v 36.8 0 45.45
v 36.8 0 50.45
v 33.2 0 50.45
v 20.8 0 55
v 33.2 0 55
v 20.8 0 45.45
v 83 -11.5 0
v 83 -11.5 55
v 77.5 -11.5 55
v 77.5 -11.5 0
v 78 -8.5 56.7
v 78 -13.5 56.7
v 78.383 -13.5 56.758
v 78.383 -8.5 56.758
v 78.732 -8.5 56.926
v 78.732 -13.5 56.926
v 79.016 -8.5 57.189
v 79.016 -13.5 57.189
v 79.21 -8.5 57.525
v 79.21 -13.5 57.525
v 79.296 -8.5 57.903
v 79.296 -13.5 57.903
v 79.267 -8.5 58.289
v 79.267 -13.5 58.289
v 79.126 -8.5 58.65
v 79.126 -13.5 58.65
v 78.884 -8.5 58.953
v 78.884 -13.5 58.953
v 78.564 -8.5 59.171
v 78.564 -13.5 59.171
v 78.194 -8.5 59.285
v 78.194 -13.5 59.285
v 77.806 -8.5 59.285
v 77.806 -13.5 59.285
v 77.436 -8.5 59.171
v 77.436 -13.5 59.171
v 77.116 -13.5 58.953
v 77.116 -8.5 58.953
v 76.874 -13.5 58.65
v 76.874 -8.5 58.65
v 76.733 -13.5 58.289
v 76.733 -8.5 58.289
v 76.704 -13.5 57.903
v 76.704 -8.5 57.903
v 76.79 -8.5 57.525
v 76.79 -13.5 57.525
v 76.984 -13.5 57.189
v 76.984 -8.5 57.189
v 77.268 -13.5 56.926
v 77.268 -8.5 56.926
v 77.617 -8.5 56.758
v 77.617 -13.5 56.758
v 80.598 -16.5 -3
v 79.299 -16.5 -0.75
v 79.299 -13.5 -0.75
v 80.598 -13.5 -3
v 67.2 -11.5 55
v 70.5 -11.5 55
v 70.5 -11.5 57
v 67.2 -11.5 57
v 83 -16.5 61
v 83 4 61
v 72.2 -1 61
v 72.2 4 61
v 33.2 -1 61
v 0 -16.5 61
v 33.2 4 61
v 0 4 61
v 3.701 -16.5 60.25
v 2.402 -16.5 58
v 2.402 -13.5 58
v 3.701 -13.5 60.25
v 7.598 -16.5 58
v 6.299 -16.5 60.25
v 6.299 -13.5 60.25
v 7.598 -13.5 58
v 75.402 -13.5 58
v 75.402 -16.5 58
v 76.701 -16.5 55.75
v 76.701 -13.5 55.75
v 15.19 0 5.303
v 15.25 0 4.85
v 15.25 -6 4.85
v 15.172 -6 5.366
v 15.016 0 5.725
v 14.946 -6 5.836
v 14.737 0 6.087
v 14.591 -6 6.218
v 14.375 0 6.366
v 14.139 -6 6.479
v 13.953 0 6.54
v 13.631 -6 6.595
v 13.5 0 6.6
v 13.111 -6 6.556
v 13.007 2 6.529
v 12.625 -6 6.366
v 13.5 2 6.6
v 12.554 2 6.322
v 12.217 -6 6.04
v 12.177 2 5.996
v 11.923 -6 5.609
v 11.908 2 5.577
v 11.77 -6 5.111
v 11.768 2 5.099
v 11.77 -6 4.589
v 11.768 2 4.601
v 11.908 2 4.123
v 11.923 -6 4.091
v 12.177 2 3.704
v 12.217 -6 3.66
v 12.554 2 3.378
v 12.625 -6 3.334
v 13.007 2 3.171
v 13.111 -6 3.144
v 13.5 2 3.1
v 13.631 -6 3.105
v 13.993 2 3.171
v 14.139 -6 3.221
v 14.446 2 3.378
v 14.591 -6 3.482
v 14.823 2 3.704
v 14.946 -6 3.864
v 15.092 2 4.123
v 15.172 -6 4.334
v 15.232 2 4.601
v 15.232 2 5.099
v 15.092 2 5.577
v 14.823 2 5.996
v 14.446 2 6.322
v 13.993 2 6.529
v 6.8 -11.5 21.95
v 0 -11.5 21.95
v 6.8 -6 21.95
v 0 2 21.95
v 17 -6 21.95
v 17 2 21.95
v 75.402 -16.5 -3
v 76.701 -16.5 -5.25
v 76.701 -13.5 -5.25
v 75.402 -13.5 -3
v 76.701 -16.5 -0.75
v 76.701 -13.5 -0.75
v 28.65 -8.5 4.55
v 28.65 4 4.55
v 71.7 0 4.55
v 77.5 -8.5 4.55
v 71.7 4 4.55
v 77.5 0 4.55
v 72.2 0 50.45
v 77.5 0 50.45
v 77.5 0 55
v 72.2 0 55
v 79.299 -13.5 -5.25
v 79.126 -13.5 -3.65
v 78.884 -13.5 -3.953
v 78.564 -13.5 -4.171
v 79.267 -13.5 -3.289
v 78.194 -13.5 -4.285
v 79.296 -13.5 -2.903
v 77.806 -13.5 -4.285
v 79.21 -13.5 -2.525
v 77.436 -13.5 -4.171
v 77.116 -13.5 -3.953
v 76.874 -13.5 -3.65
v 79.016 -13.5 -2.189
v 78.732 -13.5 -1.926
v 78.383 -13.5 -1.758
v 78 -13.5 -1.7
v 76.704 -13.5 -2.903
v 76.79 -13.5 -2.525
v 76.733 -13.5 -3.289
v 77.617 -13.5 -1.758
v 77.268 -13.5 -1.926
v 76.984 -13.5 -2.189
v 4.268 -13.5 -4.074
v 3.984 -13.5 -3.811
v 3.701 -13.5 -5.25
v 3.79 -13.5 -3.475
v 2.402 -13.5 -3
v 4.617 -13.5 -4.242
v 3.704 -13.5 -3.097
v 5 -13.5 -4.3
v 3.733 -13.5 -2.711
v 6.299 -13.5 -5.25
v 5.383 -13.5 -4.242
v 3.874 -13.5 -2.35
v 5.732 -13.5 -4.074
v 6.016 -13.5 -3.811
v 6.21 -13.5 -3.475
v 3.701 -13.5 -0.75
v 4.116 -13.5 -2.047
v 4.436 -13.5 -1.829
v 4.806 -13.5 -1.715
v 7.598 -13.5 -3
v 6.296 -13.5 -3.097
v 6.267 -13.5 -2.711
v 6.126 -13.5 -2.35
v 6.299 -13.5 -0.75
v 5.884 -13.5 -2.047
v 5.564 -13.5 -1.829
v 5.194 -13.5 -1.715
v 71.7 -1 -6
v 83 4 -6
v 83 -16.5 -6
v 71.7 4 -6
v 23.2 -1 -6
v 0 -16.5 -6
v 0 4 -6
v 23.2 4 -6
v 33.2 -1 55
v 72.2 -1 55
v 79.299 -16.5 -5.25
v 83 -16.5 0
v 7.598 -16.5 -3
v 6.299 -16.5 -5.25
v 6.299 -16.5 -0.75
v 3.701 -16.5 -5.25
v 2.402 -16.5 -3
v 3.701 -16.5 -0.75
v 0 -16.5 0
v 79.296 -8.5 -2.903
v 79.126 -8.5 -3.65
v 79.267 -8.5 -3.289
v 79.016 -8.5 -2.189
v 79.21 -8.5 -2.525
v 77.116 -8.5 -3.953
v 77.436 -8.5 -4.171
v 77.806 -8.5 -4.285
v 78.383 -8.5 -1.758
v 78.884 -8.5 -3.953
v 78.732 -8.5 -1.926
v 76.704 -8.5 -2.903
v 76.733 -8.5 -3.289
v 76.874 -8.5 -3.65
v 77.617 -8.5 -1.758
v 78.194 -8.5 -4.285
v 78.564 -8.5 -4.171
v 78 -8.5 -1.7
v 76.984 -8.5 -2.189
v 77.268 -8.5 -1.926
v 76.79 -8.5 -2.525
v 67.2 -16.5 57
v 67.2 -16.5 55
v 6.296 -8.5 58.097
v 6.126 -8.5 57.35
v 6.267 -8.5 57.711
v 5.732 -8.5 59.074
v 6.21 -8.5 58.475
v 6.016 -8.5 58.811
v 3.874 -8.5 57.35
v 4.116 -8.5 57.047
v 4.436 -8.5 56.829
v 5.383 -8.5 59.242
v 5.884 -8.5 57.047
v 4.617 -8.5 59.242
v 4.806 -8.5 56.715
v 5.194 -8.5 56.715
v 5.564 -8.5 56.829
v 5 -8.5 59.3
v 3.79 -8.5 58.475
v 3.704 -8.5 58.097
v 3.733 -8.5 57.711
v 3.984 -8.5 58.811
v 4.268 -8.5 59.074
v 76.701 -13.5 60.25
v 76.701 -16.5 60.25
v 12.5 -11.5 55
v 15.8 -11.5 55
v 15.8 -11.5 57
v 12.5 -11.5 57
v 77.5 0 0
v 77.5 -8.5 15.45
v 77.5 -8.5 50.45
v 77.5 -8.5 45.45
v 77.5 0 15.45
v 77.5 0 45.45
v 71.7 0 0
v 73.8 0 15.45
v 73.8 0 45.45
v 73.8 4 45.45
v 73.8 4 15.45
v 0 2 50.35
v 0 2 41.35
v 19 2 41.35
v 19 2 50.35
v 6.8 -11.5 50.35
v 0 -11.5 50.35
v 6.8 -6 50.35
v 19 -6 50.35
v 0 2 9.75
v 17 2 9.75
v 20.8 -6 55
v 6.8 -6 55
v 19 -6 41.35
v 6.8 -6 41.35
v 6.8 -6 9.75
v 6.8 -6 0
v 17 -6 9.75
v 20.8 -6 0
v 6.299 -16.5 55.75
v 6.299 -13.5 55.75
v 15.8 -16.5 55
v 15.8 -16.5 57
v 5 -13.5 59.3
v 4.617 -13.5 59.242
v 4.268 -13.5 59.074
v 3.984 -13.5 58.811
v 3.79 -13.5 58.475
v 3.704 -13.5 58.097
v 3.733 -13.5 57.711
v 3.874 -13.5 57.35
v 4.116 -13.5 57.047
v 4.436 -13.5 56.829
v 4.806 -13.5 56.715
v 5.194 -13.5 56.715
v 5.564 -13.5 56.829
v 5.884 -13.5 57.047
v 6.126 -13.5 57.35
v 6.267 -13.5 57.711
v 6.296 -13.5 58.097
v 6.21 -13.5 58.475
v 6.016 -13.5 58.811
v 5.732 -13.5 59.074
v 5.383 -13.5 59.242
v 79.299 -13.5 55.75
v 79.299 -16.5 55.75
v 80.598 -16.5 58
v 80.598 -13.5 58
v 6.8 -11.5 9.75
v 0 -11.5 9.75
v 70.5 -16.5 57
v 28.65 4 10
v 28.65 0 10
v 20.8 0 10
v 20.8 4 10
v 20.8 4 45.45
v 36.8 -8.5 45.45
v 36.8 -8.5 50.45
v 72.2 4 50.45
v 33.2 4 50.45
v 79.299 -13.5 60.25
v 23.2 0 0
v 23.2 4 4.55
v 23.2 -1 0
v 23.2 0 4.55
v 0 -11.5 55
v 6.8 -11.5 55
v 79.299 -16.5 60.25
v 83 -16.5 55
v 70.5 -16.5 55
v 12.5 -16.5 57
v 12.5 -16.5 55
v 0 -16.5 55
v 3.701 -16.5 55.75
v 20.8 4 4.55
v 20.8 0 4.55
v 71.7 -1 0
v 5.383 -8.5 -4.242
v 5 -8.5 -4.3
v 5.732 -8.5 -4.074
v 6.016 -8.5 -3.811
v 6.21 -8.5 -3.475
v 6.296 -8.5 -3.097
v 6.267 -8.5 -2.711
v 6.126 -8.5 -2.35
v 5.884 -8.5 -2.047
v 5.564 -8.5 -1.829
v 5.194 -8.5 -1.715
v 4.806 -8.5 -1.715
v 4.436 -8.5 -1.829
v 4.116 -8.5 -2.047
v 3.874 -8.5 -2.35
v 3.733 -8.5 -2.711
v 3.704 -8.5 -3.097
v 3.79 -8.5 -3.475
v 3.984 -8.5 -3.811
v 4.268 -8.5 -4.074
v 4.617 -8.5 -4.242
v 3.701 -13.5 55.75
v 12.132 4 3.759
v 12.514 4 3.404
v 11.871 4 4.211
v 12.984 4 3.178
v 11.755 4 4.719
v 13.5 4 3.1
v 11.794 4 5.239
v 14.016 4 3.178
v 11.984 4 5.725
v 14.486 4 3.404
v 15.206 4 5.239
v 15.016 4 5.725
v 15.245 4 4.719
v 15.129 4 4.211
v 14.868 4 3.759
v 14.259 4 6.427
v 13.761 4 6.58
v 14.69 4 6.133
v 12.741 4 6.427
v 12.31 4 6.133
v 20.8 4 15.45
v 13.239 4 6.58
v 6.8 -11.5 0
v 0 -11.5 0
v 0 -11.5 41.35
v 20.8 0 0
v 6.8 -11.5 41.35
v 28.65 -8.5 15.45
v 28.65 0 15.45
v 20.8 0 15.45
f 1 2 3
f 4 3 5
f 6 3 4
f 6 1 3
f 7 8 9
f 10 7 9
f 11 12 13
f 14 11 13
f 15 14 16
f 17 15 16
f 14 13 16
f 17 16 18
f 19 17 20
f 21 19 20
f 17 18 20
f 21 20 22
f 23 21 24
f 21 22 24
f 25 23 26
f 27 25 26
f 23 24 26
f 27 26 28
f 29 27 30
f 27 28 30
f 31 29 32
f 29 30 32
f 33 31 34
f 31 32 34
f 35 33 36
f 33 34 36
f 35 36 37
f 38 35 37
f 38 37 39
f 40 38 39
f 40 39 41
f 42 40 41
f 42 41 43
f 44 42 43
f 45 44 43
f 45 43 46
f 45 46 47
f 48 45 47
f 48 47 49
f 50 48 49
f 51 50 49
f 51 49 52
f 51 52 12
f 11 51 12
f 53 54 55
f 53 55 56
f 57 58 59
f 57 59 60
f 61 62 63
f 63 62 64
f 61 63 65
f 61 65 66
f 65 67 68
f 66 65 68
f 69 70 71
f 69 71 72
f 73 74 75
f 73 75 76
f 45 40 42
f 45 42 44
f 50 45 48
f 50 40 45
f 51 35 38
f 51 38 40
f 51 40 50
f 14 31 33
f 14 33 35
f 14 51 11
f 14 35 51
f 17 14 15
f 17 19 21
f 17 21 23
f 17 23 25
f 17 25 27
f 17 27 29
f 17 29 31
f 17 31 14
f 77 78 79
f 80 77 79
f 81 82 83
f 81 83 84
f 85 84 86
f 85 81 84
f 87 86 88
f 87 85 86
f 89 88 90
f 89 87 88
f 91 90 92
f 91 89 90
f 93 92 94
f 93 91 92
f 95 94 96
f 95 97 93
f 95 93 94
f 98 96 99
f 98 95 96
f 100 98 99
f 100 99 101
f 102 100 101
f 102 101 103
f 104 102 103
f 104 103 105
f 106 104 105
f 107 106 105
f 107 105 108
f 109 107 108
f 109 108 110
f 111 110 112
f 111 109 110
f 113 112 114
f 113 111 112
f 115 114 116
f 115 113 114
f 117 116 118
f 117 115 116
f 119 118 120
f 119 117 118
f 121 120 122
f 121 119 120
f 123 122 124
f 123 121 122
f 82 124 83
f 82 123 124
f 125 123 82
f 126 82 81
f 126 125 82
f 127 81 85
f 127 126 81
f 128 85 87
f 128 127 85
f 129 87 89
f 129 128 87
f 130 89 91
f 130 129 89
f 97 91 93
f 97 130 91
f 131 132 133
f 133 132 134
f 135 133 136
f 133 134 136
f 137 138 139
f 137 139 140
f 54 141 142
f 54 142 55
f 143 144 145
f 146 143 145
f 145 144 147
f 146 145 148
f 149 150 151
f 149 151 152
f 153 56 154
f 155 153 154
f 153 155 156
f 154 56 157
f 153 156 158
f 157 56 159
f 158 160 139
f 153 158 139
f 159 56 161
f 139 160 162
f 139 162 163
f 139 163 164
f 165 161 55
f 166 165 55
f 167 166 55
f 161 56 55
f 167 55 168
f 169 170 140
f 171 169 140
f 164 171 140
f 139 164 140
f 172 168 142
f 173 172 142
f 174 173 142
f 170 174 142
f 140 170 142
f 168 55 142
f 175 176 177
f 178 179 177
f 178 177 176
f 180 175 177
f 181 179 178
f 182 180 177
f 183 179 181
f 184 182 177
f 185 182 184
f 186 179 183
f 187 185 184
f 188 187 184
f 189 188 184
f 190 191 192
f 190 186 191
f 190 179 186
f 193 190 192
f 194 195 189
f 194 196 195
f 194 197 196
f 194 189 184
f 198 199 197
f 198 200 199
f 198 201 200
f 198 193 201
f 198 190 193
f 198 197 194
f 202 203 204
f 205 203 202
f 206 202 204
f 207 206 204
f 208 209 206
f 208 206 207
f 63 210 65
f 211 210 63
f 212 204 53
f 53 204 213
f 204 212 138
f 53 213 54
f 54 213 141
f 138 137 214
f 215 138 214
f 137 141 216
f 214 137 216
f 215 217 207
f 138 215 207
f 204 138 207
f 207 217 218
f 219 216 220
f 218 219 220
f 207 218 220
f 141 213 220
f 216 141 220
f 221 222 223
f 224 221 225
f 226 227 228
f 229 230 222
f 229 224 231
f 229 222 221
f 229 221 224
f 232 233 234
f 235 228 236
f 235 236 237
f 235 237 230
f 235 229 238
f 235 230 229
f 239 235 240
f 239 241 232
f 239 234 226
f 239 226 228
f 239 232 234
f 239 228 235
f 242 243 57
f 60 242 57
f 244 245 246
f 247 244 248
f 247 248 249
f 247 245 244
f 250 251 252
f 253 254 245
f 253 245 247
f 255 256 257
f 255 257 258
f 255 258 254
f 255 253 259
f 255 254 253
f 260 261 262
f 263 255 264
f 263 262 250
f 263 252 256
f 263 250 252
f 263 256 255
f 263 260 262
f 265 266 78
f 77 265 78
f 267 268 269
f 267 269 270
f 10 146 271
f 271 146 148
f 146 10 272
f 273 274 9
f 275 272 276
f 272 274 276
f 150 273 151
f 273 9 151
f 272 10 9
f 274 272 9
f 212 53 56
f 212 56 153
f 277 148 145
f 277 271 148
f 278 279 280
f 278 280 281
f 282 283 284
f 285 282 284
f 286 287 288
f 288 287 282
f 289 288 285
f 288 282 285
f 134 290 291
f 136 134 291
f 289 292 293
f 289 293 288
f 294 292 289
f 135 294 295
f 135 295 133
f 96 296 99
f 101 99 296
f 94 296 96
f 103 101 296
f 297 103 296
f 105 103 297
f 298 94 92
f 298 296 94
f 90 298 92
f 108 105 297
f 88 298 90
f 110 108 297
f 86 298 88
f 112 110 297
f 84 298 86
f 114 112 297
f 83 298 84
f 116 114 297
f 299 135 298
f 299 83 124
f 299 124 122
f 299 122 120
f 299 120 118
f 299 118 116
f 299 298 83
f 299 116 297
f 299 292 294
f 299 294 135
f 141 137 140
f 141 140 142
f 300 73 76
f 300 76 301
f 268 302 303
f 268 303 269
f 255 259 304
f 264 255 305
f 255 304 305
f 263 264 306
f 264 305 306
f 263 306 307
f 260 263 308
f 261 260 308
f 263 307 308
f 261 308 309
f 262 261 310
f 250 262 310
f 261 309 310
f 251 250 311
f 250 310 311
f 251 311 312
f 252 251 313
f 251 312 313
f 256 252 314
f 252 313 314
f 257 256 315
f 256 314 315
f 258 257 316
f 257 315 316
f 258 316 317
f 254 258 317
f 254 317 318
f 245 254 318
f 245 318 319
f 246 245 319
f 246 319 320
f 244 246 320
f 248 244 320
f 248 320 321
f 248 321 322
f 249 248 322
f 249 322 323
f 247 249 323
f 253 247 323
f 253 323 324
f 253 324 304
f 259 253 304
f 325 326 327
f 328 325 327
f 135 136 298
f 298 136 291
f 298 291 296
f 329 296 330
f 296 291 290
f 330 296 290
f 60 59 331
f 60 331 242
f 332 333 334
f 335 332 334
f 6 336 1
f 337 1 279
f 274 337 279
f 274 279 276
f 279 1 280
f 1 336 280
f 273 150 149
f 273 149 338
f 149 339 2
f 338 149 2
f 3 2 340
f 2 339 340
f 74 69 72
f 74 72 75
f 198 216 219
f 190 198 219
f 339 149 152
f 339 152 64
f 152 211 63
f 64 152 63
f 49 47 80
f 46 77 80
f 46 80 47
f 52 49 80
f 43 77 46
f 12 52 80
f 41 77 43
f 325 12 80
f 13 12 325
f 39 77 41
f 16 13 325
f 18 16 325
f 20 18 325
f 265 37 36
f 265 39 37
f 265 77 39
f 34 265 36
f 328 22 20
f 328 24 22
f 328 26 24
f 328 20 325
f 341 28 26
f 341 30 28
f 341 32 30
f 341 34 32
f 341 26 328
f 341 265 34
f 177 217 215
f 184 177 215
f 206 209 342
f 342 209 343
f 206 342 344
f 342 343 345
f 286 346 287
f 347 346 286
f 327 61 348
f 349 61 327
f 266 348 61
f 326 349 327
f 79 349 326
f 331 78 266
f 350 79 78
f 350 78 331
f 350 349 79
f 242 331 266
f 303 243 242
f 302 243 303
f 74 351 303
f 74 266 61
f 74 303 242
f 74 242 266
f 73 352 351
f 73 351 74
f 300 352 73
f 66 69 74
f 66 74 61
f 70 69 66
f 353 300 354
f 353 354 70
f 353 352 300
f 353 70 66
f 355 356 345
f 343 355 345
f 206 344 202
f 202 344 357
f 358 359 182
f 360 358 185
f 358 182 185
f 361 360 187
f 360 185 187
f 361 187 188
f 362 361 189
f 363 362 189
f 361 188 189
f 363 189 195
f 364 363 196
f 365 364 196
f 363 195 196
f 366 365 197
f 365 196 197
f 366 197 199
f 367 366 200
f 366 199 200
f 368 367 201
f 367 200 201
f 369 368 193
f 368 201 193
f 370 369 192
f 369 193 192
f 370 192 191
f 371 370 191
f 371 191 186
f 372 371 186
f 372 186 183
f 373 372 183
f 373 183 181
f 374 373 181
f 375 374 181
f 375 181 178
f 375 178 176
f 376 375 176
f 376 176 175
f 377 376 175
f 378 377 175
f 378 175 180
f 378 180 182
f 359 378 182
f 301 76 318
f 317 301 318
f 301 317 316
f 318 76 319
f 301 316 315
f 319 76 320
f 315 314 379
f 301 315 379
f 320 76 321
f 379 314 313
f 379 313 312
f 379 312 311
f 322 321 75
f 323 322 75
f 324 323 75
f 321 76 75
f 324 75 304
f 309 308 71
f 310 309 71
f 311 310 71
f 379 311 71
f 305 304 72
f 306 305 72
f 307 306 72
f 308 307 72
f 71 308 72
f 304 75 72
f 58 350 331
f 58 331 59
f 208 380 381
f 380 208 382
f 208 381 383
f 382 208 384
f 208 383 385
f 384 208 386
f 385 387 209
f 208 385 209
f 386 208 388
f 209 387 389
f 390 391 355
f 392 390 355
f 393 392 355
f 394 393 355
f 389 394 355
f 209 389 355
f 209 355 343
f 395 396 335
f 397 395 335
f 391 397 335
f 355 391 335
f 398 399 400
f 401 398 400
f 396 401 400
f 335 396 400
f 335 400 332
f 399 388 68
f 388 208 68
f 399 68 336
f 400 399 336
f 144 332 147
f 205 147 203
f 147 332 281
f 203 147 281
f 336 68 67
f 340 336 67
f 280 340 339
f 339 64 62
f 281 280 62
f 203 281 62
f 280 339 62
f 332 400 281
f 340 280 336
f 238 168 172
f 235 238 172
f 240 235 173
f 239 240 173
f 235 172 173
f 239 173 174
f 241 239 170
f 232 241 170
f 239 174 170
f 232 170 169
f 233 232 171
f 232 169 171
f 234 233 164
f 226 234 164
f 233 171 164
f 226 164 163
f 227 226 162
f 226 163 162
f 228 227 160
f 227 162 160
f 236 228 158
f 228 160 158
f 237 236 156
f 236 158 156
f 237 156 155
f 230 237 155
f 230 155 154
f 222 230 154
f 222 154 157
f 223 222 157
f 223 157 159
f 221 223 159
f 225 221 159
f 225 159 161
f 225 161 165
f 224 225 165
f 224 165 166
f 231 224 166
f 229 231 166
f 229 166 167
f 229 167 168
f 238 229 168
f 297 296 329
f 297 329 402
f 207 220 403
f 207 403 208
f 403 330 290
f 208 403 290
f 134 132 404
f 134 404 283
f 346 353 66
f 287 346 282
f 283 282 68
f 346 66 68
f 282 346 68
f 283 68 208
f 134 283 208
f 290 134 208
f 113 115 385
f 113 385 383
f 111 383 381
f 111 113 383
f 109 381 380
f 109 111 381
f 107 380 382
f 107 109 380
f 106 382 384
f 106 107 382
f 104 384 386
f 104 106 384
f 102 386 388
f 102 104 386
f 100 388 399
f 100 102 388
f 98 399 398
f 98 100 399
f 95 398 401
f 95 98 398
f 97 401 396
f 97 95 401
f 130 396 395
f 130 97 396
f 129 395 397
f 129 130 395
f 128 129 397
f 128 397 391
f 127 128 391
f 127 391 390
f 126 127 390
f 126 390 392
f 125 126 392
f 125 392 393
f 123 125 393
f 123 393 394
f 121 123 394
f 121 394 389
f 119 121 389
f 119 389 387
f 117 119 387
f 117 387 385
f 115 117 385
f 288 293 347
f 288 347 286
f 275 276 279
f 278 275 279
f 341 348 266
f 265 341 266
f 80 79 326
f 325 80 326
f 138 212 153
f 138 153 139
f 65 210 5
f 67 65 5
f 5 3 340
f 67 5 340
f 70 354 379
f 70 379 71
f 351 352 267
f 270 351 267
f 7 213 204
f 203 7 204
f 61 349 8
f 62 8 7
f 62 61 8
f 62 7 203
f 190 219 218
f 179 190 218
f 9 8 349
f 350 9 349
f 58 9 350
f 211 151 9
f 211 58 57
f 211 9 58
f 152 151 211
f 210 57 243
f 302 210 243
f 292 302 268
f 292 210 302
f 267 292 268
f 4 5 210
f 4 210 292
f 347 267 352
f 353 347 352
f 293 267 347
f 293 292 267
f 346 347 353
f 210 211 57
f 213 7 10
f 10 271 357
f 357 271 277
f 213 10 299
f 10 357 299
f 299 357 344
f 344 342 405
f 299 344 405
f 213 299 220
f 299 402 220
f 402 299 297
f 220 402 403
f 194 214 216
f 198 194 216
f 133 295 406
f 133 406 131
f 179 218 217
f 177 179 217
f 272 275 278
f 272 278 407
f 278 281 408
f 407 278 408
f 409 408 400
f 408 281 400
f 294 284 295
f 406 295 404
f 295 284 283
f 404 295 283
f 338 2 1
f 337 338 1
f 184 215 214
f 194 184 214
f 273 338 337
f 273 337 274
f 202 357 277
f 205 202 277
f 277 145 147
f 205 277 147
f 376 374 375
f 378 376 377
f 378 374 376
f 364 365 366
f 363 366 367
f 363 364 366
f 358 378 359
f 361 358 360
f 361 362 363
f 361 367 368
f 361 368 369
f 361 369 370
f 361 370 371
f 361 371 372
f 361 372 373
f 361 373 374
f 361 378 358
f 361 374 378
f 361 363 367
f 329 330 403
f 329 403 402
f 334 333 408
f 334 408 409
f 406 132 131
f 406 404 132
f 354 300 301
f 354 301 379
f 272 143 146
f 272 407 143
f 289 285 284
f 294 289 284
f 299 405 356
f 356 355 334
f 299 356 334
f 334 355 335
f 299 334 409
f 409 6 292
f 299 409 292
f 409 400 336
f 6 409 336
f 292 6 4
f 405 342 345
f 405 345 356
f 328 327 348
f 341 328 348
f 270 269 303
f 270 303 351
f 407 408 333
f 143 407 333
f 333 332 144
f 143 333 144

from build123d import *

# Parameters (mm, degrees)
SKETCH1_R               = 1.75
SKETCH1_W               = 53
SKETCH1_H               = 30
BOSS_EXTRUDE1_DEPTH     = 2
BOSS_EXTRUDE2_OUTLINE_R = 1.75
BOSS_EXTRUDE2_DEPTH     = 11.5
SKETCH3_R               = 1.75
SKETCH3_W               = 53
SKETCH3_H               = 30
BOSS_EXTRUDE3_DEPTH     = 2
BOSS_EXTRUDE4_DEPTH     = 6
BOSS_EXTRUDE5_DEPTH     = 6
SKETCH7_W               = 3.3
SKETCH7_H               = 5
CUT_EXTRUDE3_DEPTH      = 2
SKETCH9_W               = 55
SKETCH9_H               = 5.5
CUT_EXTRUDE5_DEPTH      = 14
SKETCH10_W              = 5.5
SKETCH10_H              = 11.5
BOSS_EXTRUDE6_DEPTH     = 55
BOSS_EXTRUDE8_DEPTH     = 8.5
CUT_EXTRUDE6_DEPTH      = 3
SKETCH15_R              = 1.3
CUT_EXTRUDE7_DEPTH      = 8


# Read off the part's stored shape, not the designer's step: Boss-Extrude2
with BuildPart() as part:
    # Sketch1 → Boss-Extrude1 (new body)
    with BuildSketch(Plane(origin=(0, 0, 0), x_dir=(1, 0, 0), z_dir=(0, 1, 0))):
        Polygon((0, 0), (23.2, 0), (23.2, -4.55), (20.8, -4.55), (20.8, -10), (28.65, -10), (28.65, -4.55), (71.7, -4.55), (71.7, 0), (83, 0), (83, -22.35), (83, -30.15), (83, -55), (72.2, -55), (72.2, -50.45), (33.2, -50.45), (33.2, -55), (0, -55), (0, -50.35), (19, -50.35), (19, -41.35), (0, -41.35), (0, -21.95), (17, -21.95), (17, -9.75), (0, -9.75), align=None)
        with Locations(Location((13.5, -4.85, 0), (0, 0, 270))):
            Circle(SKETCH1_R, mode=Mode.SUBTRACT)
        with Locations((47.3, -30.45)):
            Rectangle(SKETCH1_W, SKETCH1_H, mode=Mode.SUBTRACT)
    extrude(amount=BOSS_EXTRUDE1_DEPTH)

    # Boss-Extrude2 outline → Boss-Extrude2 (add)
    with BuildSketch(Plane.XZ):
        Polygon((0, 9.75), (0, 0), (20.8, 0), (20.8, 55), (0, 55), (0, 50.35), (19, 50.35), (19, 41.35), (0, 41.35), (0, 21.95), (17, 21.95), (17, 9.75), align=None)
        with Locations((13.5, 4.85)):
            Circle(BOSS_EXTRUDE2_OUTLINE_R, mode=Mode.SUBTRACT)
    extrude(amount=BOSS_EXTRUDE2_DEPTH)

    # Sketch3 → Boss-Extrude3 (add)
    with BuildSketch(Plane(origin=(0, 2, 0), x_dir=(1, 0, 0), z_dir=(0, 1, 0))):
        Polygon((23.2, 0), (0, 0), (0, -55), (33.2, -55), (33.2, -50.45), (72.2, -50.45), (72.2, -55), (83, -55), (83, 0), (71.7, 0), (71.7, -4.55), (28.65, -4.55), (28.65, -10), (20.8, -10), (20.8, -4.55), (23.2, -4.55), align=None)
        with Locations(Location((13.5, -4.85, 0), (0, 0, 90))):
            Circle(SKETCH3_R, mode=Mode.SUBTRACT)
        with Locations((47.3, -30.45)):
            Rectangle(SKETCH3_W, SKETCH3_H, mode=Mode.SUBTRACT)
    extrude(amount=BOSS_EXTRUDE3_DEPTH)

    # Sketch4 → Boss-Extrude4 (add)
    with BuildSketch(Plane.XY.offset(55)):
        Polygon((0, 4), (33.2, 4), (33.2, 0), (33.2, -1), (72.2, -1), (72.2, 0), (72.2, 4), (83, 4), (83, -11.5), (83, -16.5), (0, -16.5), (0, -11.5), align=None)
    extrude(amount=BOSS_EXTRUDE4_DEPTH)

    # Sketch5 → Boss-Extrude5 (add)
    with BuildSketch(Plane(origin=(0, 0, 0), x_dir=(-1, 0, 0), z_dir=(0, 0, -1))):
        Polygon((-23.2, 4), (-23.2, 0), (-23.2, -1), (-71.7, -1), (-71.7, 0), (-71.7, 4), (-83, 4), (-83, -11.5), (-83, -16.5), (0, -16.5), (0, -11.5), (0, 4), align=None)
    extrude(amount=BOSS_EXTRUDE5_DEPTH)

    # Sketch7 → Cut-Extrude3 (cut)
    with BuildSketch(Plane(origin=(0, 0, 55), x_dir=(-1, 0, 0), z_dir=(0, 0, -1))):
        with Locations((-14.15, -14)):
            Rectangle(SKETCH7_W, SKETCH7_H)
        with Locations((-68.85, -14)):
            Rectangle(SKETCH7_W, SKETCH7_H)
    extrude(amount=-CUT_EXTRUDE3_DEPTH, mode=Mode.SUBTRACT)

    # Sketch9 → Cut-Extrude5 (cut)
    with BuildSketch(Plane(origin=(20.8, 0, 0), x_dir=(0, 0, -1), z_dir=(1, 0, 0))):
        with Locations((-27.5, -8.75)):
            Rectangle(SKETCH9_W, SKETCH9_H)
    extrude(amount=-CUT_EXTRUDE5_DEPTH, mode=Mode.SUBTRACT)

    # Sketch10 → Boss-Extrude6 (add)
    with BuildSketch(Plane(origin=(0, 0, 55), x_dir=(-1, 0, 0), z_dir=(0, 0, -1))):
        with Locations((-80.25, -5.75)):
            Rectangle(SKETCH10_W, SKETCH10_H)
    extrude(amount=BOSS_EXTRUDE6_DEPTH)

    # Sketch12 → Boss-Extrude8 (add)
    with BuildSketch(Plane.XZ):
        Polygon((73.8, 45.45), (77.5, 45.45), (77.5, 50.45), (72.2, 50.45), (36.8, 50.45), (36.8, 45.45), align=None)
        Polygon((28.65, 10), (28.65, 4.55), (71.7, 4.55), (77.5, 4.55), (77.5, 15.45), (73.8, 15.45), (28.65, 15.45), align=None)
    extrude(amount=BOSS_EXTRUDE8_DEPTH)

    # Sketch14 → Cut-Extrude6 (cut)
    with BuildSketch(Plane.XZ.offset(16.5)):
        Polygon((79.299038106, 55.75), (80.598076211, 58), (79.299038106, 60.25), (76.700961894, 60.25), (75.401923789, 58), (76.700961894, 55.75), align=None)
        Polygon((6.299038106, 55.75), (3.700961894, 55.75), (2.401923789, 58), (3.700961894, 60.25), (6.299038106, 60.25), (7.598076211, 58), align=None)
        Polygon((3.700961894, -0.75), (2.401923789, -3), (3.700961894, -5.25), (6.299038106, -5.25), (7.598076211, -3), (6.299038106, -0.75), align=None)
        Polygon((76.700961894, -0.75), (79.299038106, -0.75), (80.598076211, -3), (79.299038106, -5.25), (76.700961894, -5.25), (75.401923789, -3), align=None)
    extrude(amount=-CUT_EXTRUDE6_DEPTH, mode=Mode.SUBTRACT)

    # Sketch15 → Cut-Extrude7 (cut)
    with BuildSketch(Plane.XZ.offset(16.5)):
        with Locations(Location((78, 58, 0), (0, 0, 270))):
            Circle(SKETCH15_R)
        with Locations(Location((5, 58, 0), (0, 0, 90))):
            Circle(SKETCH15_R)
        with Locations(Location((78, -3, 0), (0, 0, 90))):
            Circle(SKETCH15_R)
        with Locations(Location((5, -3, 0), (0, 0, 270))):
            Circle(SKETCH15_R)
    extrude(amount=-CUT_EXTRUDE7_DEPTH, mode=Mode.SUBTRACT)


solid = part.part
